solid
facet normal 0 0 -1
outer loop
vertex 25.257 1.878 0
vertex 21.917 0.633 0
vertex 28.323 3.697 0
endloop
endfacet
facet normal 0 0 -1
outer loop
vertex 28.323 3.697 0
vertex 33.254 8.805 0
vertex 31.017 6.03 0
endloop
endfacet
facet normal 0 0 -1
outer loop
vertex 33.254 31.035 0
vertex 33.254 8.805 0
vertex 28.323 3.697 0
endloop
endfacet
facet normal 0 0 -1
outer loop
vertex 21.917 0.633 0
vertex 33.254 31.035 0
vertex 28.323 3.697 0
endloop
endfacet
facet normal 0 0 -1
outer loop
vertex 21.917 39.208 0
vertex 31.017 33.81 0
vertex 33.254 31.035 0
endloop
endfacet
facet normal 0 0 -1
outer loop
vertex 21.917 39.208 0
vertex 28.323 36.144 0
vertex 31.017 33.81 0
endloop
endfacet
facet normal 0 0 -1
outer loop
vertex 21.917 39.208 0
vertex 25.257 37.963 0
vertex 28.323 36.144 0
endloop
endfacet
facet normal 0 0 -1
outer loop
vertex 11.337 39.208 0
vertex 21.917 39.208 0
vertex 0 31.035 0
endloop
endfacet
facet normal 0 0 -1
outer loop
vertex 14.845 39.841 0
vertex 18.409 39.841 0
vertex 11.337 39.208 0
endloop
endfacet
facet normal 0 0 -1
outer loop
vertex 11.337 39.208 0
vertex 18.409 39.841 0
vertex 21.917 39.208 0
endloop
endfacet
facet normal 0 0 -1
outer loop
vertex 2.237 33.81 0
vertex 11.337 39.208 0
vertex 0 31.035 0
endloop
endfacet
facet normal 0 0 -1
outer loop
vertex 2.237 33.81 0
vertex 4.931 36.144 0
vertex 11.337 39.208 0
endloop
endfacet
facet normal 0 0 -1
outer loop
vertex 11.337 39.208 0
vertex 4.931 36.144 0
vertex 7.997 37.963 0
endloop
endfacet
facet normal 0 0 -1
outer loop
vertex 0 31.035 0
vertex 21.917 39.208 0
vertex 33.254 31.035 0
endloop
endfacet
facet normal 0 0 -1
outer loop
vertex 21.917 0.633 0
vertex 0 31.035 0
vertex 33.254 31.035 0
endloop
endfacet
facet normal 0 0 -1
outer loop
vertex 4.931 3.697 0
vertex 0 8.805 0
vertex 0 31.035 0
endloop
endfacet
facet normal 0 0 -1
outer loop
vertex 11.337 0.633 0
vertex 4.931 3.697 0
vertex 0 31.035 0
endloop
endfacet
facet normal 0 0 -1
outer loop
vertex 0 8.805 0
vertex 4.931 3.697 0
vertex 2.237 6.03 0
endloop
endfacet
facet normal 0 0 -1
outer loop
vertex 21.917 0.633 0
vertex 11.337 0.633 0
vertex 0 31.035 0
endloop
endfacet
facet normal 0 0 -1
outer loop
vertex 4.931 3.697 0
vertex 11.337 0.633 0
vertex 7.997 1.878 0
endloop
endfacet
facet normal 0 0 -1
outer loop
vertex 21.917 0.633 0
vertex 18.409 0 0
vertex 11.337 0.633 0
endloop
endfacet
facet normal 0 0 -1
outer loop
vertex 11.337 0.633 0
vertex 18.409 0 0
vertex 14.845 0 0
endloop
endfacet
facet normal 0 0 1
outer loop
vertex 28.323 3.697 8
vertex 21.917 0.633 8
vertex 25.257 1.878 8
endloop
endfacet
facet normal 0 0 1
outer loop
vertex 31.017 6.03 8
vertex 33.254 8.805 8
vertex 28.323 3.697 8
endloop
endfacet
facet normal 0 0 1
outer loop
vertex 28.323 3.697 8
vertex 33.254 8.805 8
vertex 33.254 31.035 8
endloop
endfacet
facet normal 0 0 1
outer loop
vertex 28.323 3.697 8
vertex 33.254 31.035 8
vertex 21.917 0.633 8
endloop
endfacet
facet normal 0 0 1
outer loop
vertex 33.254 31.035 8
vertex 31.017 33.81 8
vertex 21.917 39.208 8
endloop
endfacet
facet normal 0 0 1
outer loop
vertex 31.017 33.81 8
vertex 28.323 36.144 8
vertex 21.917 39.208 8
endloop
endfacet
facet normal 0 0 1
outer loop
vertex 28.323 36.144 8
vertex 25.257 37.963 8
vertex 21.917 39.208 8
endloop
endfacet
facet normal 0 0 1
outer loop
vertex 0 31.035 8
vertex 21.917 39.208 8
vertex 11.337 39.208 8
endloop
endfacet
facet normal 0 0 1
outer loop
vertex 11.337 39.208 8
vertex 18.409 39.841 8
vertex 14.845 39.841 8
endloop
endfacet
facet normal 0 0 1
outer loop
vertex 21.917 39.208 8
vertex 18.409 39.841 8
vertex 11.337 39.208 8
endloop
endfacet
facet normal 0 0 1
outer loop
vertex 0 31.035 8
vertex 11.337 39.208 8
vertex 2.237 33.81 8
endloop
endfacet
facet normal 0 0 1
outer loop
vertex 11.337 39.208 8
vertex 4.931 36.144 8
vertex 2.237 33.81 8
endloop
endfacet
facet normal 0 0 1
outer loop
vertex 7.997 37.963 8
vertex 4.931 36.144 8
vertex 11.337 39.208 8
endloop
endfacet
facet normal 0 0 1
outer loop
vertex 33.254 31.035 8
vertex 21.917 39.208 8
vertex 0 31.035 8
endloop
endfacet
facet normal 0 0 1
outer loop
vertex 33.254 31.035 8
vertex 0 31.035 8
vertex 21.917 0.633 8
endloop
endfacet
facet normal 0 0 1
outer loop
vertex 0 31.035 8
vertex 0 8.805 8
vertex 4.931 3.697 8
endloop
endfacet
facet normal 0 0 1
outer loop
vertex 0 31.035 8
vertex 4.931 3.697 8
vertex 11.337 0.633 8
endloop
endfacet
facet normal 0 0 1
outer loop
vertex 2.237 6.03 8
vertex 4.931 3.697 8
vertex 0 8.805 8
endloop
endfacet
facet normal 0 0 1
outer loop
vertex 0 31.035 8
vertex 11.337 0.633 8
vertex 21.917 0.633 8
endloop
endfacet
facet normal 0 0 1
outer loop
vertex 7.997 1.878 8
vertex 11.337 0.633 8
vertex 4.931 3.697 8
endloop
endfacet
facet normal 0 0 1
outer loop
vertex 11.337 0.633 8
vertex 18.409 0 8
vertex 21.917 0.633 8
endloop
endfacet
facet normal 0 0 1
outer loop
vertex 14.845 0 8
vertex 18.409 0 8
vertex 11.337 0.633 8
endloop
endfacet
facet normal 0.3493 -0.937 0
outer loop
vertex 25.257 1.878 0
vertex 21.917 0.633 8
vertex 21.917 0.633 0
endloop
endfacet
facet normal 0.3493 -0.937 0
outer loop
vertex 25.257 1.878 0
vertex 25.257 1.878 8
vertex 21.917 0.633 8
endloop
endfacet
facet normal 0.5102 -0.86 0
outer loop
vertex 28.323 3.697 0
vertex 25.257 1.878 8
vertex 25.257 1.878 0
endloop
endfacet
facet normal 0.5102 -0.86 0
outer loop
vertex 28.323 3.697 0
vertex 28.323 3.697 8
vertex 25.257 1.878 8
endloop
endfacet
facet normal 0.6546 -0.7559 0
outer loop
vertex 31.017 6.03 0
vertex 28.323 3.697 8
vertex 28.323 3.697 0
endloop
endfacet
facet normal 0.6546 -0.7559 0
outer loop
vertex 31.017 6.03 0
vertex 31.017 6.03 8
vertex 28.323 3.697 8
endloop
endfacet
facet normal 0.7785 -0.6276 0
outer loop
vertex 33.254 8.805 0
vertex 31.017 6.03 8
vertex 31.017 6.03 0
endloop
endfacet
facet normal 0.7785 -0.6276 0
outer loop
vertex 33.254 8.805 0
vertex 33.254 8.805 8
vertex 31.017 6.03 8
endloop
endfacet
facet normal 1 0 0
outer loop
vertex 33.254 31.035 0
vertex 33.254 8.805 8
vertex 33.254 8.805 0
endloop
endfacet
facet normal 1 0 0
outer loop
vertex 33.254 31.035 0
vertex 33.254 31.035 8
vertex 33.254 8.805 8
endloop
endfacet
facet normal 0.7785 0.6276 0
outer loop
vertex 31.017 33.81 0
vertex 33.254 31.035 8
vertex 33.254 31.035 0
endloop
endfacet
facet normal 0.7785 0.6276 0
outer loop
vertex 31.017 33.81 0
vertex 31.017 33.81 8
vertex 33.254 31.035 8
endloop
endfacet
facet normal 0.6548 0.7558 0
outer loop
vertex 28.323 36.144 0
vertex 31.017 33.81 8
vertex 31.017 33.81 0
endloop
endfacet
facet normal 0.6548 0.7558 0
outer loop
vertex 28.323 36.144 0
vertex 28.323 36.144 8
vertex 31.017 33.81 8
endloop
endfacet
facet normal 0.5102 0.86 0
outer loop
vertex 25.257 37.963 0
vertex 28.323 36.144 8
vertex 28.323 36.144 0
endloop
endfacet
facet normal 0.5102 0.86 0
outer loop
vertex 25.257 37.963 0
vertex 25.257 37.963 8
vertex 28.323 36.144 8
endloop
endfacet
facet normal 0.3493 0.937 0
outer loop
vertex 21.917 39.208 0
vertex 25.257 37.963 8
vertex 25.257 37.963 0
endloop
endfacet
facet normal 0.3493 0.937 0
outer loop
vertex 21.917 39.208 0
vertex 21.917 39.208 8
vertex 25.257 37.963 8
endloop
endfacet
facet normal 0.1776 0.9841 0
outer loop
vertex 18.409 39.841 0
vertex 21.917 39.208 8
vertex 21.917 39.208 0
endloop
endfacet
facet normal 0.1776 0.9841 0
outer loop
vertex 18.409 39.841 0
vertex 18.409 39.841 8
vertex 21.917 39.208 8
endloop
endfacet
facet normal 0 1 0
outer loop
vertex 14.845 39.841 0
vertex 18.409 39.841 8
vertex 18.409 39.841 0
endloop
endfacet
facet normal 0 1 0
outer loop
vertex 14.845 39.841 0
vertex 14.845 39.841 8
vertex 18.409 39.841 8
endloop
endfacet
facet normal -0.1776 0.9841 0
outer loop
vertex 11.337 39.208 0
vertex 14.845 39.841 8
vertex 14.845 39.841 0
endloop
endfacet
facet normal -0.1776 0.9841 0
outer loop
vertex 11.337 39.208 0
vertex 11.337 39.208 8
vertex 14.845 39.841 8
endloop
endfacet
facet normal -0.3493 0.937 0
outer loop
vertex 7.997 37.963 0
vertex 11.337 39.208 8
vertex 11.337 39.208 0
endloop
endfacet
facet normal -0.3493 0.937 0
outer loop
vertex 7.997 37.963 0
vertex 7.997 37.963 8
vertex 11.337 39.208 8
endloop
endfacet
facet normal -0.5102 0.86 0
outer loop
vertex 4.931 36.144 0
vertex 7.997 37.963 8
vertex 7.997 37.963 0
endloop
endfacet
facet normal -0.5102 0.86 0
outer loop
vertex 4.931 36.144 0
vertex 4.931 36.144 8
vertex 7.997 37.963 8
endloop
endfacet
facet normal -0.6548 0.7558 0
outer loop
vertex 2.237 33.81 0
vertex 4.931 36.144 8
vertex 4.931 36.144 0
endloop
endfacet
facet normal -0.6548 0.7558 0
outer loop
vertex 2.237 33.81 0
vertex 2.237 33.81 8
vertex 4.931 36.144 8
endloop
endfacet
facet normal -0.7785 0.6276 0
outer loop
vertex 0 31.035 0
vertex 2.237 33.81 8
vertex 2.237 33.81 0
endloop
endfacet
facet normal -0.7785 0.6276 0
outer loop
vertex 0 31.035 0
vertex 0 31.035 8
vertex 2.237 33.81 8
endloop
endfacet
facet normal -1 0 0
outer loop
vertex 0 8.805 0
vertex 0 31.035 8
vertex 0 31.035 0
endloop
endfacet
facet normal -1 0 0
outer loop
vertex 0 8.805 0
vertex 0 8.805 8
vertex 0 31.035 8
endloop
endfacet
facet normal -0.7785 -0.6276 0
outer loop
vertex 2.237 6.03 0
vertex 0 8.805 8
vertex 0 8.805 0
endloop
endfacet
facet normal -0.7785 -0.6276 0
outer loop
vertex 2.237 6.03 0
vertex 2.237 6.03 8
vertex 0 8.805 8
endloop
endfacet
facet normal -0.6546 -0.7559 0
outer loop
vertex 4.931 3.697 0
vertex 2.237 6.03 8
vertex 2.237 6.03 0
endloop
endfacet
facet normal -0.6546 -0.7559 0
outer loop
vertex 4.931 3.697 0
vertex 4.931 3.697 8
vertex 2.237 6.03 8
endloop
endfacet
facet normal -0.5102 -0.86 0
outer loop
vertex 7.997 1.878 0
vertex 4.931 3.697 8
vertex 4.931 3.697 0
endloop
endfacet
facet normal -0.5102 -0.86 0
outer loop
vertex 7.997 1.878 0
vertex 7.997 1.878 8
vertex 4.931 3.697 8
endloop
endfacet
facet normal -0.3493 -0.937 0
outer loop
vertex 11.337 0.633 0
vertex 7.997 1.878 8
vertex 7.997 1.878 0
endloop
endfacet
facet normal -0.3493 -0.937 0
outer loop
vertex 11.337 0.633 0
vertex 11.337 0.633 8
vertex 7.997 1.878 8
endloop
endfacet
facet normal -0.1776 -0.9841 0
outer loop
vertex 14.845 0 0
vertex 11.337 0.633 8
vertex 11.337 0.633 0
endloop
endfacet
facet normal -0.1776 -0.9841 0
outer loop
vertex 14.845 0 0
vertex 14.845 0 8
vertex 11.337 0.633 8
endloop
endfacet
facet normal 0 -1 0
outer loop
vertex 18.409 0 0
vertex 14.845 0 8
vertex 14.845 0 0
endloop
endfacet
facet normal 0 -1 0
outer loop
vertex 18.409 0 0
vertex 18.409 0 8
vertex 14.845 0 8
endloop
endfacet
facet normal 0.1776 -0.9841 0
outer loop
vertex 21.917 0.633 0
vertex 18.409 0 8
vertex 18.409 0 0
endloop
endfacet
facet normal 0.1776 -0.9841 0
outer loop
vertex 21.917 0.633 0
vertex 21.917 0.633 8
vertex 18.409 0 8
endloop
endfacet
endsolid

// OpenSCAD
$fn = 32;

// ----------------------------------------------------------------------
// Flat adaptor: double_d, 8 mm thick
// ----------------------------------------------------------------------

// --- parameters (mm) ---
profile_height = 8;       // extrusion height
profile_points = 24;      // points of the closed outline

profile = [[33.254, 31.035], [31.017, 33.81], [28.323, 36.144], [25.257, 37.963], [21.917, 39.208], [18.409, 39.841], [14.845, 39.841], [11.337, 39.208], [7.997, 37.963], [4.931, 36.144], [2.237, 33.81], [0, 31.035], [0, 8.805], [2.237, 6.03], [4.931, 3.697], [7.997, 1.878], [11.337, 0.633], [14.845, 0], [18.409, 0], [21.917, 0.633], [25.257, 1.878], [28.323, 3.697], [31.017, 6.03], [33.254, 8.805]];  // single closed polygon, 24 points, counter clockwise

// --- the one profile operation ---
linear_extrude(height = profile_height) polygon(points = profile);
